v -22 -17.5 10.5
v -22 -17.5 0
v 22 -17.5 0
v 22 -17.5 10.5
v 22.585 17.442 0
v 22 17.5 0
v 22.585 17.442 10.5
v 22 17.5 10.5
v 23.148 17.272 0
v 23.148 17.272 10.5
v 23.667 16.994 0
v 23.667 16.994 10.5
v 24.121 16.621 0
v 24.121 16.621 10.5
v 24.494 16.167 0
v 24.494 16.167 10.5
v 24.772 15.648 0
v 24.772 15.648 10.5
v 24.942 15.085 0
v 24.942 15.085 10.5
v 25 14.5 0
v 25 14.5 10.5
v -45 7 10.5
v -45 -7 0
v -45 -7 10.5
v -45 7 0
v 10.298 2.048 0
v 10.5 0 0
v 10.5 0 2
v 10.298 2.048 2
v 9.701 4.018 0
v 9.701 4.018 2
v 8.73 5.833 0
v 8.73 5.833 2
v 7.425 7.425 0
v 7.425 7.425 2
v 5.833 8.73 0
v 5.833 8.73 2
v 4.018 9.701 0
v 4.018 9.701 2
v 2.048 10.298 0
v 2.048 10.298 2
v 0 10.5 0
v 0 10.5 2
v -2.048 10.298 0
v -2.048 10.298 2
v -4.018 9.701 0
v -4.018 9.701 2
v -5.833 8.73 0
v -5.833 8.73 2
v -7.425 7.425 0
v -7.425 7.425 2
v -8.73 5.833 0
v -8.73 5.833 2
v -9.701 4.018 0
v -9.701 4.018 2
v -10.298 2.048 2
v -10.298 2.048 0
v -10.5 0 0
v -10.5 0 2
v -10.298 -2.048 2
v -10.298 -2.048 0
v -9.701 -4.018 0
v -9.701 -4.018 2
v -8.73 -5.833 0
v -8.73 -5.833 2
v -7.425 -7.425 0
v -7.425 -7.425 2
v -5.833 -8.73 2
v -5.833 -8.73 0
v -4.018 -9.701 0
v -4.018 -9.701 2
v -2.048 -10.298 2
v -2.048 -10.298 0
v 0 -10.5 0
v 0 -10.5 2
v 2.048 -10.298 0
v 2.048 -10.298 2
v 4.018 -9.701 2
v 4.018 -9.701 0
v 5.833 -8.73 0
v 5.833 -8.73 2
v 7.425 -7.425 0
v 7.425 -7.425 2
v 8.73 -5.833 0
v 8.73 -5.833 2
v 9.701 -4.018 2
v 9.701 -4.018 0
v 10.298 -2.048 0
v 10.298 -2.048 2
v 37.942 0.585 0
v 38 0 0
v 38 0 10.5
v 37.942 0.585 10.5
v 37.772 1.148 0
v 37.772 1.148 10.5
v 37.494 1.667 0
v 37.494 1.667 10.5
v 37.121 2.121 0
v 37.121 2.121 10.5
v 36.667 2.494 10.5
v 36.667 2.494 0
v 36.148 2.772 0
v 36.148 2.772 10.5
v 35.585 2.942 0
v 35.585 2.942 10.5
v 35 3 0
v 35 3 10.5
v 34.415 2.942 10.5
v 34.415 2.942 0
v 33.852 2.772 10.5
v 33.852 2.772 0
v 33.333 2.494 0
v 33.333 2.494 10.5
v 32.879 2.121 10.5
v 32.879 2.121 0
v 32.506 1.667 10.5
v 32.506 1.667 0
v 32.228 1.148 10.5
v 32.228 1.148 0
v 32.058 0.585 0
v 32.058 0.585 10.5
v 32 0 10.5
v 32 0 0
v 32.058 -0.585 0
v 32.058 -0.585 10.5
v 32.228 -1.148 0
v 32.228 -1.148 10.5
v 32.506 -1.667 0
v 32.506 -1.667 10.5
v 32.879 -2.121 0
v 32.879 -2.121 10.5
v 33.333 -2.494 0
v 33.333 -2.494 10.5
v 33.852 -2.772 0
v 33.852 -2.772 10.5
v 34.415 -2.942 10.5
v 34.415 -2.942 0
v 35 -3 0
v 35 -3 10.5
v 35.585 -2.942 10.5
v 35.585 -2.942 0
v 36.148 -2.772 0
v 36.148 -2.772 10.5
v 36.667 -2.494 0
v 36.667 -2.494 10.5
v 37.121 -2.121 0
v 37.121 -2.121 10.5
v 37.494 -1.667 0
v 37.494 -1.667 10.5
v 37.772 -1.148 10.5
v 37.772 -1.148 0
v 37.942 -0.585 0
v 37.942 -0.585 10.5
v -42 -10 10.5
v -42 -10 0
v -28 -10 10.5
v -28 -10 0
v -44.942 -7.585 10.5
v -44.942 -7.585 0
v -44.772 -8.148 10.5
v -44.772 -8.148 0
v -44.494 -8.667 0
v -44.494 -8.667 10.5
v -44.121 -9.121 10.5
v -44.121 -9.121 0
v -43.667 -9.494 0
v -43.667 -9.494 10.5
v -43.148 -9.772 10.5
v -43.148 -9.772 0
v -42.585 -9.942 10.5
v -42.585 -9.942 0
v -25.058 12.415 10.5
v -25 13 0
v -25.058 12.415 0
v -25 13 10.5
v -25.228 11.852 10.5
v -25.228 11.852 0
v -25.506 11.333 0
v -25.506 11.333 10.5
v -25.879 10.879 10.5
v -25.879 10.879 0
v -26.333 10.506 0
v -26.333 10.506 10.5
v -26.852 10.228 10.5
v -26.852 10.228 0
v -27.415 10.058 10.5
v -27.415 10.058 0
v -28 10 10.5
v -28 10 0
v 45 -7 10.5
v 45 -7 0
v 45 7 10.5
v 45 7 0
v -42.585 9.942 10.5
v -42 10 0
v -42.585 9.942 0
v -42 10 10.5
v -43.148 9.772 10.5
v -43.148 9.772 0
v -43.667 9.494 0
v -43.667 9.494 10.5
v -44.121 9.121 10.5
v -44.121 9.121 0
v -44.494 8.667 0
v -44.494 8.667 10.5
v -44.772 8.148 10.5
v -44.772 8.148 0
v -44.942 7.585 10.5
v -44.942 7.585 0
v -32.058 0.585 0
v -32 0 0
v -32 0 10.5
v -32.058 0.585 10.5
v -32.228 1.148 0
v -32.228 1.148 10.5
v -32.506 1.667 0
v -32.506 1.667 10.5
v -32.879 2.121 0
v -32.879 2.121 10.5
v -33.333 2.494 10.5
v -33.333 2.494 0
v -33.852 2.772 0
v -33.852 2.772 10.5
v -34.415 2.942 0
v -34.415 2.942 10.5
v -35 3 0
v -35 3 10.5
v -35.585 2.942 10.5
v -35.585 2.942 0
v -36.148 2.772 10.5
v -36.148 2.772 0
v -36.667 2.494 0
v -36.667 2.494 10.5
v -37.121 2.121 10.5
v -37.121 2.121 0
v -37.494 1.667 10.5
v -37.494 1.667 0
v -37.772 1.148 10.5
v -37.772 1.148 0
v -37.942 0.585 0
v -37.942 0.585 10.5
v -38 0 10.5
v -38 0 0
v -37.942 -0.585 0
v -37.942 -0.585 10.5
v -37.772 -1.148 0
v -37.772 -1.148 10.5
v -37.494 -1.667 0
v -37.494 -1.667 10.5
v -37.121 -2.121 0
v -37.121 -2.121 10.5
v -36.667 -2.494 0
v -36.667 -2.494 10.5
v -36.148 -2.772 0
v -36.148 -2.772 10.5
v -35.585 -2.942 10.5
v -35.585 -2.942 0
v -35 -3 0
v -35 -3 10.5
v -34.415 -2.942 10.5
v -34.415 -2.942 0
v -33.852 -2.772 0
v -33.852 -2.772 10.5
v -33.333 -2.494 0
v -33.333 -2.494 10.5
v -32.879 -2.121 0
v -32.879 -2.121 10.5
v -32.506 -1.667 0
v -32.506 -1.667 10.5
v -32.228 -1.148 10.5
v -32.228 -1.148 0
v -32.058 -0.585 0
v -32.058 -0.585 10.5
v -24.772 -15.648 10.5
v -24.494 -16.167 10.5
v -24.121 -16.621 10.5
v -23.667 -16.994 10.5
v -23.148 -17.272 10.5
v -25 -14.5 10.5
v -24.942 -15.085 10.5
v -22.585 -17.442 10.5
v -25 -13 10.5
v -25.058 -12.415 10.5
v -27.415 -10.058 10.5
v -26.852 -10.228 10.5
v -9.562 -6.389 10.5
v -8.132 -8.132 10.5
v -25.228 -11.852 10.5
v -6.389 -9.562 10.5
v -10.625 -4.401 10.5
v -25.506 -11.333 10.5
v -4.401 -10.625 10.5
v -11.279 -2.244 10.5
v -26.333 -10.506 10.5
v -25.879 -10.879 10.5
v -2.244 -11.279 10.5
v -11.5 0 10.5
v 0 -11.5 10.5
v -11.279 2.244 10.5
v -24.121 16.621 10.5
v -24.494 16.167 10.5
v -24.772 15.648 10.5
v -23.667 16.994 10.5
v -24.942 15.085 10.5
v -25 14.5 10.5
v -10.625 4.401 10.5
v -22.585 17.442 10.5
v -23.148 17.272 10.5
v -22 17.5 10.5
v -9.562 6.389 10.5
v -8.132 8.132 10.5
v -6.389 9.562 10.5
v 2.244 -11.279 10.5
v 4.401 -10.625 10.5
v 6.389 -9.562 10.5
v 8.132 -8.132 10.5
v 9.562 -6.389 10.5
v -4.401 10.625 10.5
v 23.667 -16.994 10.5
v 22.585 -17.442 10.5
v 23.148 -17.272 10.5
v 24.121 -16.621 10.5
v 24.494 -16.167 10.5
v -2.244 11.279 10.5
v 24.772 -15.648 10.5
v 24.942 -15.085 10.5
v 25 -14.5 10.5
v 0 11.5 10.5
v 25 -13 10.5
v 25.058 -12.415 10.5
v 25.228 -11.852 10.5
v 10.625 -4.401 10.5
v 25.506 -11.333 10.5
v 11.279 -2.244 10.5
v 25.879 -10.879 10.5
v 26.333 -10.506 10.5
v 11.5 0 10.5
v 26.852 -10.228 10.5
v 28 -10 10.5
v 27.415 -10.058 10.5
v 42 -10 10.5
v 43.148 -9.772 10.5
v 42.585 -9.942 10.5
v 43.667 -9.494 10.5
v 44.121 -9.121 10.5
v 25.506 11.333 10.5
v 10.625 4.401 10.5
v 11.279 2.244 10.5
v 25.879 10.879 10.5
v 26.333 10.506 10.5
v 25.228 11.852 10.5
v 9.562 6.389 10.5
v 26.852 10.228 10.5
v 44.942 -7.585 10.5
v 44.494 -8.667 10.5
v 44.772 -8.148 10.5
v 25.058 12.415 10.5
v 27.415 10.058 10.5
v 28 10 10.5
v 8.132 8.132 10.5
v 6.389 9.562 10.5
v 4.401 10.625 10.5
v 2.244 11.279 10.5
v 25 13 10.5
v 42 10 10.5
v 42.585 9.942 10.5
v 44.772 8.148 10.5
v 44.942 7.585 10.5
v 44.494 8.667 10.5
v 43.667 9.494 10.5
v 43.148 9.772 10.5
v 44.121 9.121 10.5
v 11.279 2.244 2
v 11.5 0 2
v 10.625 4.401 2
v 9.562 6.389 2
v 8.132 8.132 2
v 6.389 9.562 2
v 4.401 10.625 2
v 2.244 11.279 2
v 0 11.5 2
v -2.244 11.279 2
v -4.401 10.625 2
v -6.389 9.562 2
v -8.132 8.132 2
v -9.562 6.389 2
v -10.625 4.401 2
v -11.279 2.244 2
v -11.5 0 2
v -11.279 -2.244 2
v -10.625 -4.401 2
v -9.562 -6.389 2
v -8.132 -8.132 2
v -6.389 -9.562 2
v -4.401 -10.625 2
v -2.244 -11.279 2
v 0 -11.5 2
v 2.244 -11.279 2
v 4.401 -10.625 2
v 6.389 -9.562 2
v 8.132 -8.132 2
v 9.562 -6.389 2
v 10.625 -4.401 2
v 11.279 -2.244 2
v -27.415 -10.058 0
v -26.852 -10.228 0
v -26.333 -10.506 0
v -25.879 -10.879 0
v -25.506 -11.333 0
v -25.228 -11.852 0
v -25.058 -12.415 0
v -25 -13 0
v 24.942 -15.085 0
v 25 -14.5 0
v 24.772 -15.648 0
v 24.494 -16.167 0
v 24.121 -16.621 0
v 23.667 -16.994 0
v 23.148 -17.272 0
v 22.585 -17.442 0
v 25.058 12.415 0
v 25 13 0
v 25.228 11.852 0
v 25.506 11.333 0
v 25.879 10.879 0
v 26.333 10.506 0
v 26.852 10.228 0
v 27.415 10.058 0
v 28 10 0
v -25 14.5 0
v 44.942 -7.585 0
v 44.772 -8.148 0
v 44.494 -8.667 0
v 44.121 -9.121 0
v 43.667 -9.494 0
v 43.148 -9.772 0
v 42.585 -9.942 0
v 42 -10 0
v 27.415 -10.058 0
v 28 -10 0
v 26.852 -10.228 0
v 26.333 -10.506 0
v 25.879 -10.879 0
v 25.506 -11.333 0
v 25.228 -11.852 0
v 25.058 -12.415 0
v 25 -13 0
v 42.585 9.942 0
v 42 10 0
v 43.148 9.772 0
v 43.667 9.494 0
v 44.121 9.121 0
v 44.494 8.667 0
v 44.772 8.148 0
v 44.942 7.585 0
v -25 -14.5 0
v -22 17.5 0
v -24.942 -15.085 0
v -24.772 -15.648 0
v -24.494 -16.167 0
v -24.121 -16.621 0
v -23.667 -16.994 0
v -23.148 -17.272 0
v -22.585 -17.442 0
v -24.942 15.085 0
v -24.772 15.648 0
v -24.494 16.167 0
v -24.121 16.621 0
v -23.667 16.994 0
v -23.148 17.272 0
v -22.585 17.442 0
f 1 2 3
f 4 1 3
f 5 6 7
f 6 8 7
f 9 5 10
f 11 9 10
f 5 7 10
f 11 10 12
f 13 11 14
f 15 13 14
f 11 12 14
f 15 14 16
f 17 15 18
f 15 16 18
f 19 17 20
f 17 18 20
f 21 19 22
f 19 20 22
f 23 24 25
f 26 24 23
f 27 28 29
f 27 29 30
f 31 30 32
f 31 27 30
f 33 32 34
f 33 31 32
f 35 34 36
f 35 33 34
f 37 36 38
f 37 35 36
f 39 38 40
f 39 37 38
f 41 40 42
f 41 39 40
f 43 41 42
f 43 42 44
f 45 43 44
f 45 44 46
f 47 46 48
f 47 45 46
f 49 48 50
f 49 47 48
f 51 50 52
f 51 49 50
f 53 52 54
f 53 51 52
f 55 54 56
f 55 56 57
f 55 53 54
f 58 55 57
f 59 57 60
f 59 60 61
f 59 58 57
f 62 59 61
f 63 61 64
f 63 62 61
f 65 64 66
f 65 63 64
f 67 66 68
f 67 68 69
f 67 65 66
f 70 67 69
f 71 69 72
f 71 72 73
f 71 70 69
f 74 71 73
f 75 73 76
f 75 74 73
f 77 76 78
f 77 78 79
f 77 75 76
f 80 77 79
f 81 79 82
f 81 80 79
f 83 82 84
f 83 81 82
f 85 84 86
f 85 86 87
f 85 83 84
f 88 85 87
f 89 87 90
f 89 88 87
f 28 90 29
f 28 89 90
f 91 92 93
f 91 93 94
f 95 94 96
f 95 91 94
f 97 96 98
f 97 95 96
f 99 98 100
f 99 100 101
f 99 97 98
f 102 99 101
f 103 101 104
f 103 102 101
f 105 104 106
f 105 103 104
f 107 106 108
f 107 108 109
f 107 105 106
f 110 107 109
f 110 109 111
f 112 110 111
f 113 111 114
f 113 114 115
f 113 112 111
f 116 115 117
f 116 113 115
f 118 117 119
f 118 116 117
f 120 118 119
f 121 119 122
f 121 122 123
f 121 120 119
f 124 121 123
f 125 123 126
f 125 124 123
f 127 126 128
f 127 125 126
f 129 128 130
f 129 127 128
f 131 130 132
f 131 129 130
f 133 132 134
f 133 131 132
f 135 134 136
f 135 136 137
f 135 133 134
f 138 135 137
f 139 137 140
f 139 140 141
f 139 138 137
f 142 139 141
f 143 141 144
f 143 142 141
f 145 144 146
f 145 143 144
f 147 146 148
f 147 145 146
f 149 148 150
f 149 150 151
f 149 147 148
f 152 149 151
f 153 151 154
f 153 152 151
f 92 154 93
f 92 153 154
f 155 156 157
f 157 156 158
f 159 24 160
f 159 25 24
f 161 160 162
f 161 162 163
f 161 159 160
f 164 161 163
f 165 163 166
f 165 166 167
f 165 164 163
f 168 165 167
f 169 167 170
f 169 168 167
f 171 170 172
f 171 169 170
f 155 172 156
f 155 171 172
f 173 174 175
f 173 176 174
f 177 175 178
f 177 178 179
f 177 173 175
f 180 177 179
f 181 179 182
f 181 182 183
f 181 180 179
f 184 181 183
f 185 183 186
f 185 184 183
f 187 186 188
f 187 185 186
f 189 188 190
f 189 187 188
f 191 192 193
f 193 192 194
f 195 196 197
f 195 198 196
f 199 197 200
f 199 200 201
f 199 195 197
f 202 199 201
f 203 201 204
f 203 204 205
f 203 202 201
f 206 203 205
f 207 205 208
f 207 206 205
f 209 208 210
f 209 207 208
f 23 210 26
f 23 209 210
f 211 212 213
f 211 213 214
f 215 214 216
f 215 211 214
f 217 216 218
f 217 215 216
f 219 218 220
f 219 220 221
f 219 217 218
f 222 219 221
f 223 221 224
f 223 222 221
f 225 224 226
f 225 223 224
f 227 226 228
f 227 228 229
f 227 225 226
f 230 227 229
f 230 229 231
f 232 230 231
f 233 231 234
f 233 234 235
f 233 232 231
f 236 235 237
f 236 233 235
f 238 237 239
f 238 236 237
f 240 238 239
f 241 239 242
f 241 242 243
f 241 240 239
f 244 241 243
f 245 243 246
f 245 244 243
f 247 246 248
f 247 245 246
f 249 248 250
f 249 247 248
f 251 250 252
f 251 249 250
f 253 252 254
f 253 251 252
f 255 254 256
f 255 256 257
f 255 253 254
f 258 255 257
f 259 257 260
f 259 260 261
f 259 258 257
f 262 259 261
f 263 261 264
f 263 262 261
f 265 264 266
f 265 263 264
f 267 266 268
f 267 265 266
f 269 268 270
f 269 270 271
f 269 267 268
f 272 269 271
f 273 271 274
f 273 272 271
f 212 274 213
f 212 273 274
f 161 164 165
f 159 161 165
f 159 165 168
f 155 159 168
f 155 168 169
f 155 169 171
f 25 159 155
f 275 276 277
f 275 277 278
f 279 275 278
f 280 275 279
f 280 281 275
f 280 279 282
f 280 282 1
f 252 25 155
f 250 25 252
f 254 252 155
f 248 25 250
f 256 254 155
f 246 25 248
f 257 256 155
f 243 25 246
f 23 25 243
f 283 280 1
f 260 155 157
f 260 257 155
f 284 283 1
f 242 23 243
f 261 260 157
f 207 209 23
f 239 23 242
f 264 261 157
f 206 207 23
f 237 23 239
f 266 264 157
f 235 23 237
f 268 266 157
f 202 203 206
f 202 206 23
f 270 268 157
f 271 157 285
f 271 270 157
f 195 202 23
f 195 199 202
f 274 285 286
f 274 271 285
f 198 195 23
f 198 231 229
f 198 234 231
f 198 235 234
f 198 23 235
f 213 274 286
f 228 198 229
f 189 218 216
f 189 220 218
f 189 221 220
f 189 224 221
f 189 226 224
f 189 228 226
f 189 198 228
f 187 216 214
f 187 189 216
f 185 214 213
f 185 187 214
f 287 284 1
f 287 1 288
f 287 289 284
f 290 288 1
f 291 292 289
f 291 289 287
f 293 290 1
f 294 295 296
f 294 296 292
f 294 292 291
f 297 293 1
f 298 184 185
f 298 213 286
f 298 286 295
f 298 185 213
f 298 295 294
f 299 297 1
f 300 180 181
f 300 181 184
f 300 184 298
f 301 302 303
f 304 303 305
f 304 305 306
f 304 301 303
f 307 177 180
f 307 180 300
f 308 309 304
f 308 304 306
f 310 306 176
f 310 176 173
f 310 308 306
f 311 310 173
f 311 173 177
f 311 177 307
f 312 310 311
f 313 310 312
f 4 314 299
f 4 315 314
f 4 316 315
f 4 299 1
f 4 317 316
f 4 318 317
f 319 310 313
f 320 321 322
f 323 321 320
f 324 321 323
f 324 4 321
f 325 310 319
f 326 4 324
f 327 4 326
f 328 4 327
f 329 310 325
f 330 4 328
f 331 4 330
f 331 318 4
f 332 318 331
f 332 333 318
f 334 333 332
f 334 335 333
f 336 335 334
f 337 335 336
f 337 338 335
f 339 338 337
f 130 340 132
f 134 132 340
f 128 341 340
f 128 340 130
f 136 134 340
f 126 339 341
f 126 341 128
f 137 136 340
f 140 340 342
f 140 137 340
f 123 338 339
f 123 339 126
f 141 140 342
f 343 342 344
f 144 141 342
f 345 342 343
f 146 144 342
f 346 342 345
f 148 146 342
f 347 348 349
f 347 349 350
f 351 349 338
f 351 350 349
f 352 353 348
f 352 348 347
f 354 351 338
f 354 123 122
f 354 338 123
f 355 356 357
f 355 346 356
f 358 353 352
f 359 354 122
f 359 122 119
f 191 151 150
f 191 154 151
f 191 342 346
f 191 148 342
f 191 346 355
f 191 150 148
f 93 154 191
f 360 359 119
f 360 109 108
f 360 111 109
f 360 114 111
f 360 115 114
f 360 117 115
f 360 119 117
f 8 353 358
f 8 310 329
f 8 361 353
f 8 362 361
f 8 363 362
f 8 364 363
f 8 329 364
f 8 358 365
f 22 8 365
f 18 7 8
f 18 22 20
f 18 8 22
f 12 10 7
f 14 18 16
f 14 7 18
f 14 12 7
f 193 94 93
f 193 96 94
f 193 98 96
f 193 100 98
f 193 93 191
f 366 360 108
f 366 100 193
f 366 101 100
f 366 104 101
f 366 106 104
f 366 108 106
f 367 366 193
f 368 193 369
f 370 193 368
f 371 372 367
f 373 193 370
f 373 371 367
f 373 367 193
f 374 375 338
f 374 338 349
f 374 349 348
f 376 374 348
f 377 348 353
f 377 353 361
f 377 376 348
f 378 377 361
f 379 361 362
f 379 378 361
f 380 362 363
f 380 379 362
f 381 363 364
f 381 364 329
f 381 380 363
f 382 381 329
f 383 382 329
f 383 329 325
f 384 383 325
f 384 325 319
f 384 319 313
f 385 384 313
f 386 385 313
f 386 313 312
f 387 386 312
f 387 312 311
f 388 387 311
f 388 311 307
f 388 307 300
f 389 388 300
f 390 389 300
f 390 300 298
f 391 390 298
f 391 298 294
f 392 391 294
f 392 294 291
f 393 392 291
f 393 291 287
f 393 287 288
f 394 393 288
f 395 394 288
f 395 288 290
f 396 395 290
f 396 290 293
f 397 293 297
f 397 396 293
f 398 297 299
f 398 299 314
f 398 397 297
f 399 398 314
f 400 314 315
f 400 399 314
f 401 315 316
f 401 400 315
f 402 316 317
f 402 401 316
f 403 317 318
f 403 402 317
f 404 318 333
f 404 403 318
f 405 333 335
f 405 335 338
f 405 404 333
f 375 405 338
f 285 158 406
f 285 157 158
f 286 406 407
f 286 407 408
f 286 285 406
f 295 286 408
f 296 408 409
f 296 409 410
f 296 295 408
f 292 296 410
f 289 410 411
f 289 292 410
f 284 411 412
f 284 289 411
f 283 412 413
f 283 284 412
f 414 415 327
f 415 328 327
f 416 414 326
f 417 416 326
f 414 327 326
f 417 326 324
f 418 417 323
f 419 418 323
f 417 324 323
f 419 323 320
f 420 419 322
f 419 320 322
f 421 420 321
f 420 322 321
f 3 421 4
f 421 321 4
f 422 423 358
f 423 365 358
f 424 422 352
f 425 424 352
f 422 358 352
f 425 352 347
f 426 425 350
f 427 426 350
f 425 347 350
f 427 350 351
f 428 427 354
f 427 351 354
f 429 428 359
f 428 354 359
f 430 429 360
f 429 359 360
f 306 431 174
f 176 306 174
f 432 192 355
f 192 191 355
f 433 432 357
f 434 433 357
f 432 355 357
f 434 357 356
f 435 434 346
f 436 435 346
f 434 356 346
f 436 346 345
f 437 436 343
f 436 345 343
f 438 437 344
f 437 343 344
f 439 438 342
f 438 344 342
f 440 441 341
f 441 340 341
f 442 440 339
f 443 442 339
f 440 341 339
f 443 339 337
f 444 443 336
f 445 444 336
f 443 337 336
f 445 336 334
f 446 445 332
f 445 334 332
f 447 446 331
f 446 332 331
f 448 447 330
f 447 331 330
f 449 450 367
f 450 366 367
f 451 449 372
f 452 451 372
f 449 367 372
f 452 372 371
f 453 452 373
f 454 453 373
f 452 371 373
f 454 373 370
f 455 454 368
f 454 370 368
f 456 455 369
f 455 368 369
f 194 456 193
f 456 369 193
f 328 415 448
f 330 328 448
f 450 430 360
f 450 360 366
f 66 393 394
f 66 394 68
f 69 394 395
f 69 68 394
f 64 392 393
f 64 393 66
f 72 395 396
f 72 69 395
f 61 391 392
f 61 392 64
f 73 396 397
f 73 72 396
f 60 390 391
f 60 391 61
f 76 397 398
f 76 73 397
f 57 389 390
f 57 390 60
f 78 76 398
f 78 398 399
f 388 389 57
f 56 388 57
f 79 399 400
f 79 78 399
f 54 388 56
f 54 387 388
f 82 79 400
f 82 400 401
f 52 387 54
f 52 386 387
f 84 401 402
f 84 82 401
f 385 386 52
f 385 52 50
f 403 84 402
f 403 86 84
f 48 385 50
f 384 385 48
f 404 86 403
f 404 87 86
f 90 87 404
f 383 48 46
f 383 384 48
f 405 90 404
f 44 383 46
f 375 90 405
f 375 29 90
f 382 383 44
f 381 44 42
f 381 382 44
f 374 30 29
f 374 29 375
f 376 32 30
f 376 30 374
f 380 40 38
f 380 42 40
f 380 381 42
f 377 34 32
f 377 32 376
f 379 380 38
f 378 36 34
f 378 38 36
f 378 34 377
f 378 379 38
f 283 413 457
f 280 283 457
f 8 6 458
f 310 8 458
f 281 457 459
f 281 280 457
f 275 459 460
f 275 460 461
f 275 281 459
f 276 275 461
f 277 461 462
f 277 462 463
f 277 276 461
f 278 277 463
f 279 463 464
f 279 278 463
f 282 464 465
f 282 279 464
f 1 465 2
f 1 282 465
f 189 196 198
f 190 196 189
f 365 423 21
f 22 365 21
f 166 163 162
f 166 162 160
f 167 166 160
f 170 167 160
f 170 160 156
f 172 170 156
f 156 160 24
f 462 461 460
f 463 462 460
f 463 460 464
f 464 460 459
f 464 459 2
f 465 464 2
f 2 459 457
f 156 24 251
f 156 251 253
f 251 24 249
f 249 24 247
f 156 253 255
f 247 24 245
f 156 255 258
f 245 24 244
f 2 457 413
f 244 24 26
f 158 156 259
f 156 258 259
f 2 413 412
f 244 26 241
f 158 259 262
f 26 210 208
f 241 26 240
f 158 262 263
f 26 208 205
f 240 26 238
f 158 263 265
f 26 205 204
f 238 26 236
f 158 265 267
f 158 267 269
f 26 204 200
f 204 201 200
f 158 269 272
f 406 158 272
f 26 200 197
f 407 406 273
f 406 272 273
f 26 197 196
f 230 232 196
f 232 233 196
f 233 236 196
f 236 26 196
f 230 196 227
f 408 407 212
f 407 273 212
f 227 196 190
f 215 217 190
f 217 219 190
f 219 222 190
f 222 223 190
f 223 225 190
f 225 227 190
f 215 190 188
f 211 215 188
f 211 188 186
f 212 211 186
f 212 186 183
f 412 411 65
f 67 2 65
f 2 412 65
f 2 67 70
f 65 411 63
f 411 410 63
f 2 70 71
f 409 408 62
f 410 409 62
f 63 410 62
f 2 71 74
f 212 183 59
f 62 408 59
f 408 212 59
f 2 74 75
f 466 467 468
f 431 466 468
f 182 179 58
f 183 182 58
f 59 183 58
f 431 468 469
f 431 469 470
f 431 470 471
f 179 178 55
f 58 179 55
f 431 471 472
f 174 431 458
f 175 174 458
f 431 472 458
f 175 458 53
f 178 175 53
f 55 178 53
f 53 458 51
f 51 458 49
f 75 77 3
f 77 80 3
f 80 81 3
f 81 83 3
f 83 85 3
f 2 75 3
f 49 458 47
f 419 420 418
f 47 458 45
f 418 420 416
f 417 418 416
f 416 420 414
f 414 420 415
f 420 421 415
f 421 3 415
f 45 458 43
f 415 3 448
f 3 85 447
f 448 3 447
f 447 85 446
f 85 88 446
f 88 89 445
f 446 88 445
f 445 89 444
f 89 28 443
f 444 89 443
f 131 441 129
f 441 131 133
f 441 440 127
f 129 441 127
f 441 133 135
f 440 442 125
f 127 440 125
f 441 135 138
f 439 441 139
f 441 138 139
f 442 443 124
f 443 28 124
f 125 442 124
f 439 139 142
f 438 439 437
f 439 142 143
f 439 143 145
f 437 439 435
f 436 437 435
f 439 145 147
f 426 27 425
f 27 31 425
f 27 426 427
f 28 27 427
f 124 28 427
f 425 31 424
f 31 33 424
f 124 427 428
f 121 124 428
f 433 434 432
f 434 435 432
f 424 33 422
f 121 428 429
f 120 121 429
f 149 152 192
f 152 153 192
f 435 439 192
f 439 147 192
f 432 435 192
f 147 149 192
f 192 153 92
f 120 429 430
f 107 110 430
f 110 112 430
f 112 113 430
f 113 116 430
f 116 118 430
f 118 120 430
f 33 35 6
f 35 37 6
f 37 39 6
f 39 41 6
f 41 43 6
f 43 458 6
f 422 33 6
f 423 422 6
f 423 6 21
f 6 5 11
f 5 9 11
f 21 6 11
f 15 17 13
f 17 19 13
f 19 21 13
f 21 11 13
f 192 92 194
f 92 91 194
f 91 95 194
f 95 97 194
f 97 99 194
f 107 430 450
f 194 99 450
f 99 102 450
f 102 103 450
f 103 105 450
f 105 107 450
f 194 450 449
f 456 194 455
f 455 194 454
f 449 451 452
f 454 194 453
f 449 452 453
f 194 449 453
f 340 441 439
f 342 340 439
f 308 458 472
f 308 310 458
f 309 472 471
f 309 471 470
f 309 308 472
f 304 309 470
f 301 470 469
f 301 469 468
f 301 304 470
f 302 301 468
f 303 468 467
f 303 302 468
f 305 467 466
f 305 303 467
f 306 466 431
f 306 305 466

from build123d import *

# Parameters (mm, degrees)
F0_R     = 11.5
F0_W     = 20
F0_H     = 20
F0_R_2   = 3
F1_DEPTH = 10.5
F0_R_3   = 10.5
F2_DEPTH = 2
F3_R     = 3


with BuildPart() as f1:
    # F0 (on Top) → F1 (new body)
    with BuildSketch(Plane.XY):
        Polygon((25, 17.5), (-25, 17.5), (-25, 10), (-25, -10), (-25, -17.5), (25, -17.5), (25, -10), (25, 10), align=None)
        Circle(F0_R, mode=Mode.SUBTRACT)
        with Locations((-35, 0)):
            Rectangle(F0_W, F0_H)
        with Locations((-35, 0)):
            Circle(F0_R_2, mode=Mode.SUBTRACT)
        with Locations((35, 0)):
            Rectangle(F0_W, F0_H)
        with Locations((35, 0)):
            Circle(F0_R_2, mode=Mode.SUBTRACT)
    extrude(amount=F1_DEPTH)

    # F0 (on Top) → F2 (join)
    with BuildSketch(Plane.XY):
        Circle(F0_R)
        Circle(F0_R_3, mode=Mode.SUBTRACT)
    extrude(amount=F2_DEPTH)

    # F3
    f3_edges = [f1.edges().sort_by_distance(p)[0] for p in [
        (-25, -10, 5.25),
        (-25, 10, 5.25),
        (25, 10, 5.25),
        (25, -10, 5.25),
        (25, 17.5, 5.25),
        (25, -17.5, 5.25),
        (-25, -17.5, 5.25),
        (-25, 17.5, 5.25),
        (-45, 10, 5.25),
        (-45, -10, 5.25),
        (45, -10, 5.25),
        (45, 10, 5.25),
    ]]
    fillet(f3_edges, radius=F3_R)


solid = f1.part
